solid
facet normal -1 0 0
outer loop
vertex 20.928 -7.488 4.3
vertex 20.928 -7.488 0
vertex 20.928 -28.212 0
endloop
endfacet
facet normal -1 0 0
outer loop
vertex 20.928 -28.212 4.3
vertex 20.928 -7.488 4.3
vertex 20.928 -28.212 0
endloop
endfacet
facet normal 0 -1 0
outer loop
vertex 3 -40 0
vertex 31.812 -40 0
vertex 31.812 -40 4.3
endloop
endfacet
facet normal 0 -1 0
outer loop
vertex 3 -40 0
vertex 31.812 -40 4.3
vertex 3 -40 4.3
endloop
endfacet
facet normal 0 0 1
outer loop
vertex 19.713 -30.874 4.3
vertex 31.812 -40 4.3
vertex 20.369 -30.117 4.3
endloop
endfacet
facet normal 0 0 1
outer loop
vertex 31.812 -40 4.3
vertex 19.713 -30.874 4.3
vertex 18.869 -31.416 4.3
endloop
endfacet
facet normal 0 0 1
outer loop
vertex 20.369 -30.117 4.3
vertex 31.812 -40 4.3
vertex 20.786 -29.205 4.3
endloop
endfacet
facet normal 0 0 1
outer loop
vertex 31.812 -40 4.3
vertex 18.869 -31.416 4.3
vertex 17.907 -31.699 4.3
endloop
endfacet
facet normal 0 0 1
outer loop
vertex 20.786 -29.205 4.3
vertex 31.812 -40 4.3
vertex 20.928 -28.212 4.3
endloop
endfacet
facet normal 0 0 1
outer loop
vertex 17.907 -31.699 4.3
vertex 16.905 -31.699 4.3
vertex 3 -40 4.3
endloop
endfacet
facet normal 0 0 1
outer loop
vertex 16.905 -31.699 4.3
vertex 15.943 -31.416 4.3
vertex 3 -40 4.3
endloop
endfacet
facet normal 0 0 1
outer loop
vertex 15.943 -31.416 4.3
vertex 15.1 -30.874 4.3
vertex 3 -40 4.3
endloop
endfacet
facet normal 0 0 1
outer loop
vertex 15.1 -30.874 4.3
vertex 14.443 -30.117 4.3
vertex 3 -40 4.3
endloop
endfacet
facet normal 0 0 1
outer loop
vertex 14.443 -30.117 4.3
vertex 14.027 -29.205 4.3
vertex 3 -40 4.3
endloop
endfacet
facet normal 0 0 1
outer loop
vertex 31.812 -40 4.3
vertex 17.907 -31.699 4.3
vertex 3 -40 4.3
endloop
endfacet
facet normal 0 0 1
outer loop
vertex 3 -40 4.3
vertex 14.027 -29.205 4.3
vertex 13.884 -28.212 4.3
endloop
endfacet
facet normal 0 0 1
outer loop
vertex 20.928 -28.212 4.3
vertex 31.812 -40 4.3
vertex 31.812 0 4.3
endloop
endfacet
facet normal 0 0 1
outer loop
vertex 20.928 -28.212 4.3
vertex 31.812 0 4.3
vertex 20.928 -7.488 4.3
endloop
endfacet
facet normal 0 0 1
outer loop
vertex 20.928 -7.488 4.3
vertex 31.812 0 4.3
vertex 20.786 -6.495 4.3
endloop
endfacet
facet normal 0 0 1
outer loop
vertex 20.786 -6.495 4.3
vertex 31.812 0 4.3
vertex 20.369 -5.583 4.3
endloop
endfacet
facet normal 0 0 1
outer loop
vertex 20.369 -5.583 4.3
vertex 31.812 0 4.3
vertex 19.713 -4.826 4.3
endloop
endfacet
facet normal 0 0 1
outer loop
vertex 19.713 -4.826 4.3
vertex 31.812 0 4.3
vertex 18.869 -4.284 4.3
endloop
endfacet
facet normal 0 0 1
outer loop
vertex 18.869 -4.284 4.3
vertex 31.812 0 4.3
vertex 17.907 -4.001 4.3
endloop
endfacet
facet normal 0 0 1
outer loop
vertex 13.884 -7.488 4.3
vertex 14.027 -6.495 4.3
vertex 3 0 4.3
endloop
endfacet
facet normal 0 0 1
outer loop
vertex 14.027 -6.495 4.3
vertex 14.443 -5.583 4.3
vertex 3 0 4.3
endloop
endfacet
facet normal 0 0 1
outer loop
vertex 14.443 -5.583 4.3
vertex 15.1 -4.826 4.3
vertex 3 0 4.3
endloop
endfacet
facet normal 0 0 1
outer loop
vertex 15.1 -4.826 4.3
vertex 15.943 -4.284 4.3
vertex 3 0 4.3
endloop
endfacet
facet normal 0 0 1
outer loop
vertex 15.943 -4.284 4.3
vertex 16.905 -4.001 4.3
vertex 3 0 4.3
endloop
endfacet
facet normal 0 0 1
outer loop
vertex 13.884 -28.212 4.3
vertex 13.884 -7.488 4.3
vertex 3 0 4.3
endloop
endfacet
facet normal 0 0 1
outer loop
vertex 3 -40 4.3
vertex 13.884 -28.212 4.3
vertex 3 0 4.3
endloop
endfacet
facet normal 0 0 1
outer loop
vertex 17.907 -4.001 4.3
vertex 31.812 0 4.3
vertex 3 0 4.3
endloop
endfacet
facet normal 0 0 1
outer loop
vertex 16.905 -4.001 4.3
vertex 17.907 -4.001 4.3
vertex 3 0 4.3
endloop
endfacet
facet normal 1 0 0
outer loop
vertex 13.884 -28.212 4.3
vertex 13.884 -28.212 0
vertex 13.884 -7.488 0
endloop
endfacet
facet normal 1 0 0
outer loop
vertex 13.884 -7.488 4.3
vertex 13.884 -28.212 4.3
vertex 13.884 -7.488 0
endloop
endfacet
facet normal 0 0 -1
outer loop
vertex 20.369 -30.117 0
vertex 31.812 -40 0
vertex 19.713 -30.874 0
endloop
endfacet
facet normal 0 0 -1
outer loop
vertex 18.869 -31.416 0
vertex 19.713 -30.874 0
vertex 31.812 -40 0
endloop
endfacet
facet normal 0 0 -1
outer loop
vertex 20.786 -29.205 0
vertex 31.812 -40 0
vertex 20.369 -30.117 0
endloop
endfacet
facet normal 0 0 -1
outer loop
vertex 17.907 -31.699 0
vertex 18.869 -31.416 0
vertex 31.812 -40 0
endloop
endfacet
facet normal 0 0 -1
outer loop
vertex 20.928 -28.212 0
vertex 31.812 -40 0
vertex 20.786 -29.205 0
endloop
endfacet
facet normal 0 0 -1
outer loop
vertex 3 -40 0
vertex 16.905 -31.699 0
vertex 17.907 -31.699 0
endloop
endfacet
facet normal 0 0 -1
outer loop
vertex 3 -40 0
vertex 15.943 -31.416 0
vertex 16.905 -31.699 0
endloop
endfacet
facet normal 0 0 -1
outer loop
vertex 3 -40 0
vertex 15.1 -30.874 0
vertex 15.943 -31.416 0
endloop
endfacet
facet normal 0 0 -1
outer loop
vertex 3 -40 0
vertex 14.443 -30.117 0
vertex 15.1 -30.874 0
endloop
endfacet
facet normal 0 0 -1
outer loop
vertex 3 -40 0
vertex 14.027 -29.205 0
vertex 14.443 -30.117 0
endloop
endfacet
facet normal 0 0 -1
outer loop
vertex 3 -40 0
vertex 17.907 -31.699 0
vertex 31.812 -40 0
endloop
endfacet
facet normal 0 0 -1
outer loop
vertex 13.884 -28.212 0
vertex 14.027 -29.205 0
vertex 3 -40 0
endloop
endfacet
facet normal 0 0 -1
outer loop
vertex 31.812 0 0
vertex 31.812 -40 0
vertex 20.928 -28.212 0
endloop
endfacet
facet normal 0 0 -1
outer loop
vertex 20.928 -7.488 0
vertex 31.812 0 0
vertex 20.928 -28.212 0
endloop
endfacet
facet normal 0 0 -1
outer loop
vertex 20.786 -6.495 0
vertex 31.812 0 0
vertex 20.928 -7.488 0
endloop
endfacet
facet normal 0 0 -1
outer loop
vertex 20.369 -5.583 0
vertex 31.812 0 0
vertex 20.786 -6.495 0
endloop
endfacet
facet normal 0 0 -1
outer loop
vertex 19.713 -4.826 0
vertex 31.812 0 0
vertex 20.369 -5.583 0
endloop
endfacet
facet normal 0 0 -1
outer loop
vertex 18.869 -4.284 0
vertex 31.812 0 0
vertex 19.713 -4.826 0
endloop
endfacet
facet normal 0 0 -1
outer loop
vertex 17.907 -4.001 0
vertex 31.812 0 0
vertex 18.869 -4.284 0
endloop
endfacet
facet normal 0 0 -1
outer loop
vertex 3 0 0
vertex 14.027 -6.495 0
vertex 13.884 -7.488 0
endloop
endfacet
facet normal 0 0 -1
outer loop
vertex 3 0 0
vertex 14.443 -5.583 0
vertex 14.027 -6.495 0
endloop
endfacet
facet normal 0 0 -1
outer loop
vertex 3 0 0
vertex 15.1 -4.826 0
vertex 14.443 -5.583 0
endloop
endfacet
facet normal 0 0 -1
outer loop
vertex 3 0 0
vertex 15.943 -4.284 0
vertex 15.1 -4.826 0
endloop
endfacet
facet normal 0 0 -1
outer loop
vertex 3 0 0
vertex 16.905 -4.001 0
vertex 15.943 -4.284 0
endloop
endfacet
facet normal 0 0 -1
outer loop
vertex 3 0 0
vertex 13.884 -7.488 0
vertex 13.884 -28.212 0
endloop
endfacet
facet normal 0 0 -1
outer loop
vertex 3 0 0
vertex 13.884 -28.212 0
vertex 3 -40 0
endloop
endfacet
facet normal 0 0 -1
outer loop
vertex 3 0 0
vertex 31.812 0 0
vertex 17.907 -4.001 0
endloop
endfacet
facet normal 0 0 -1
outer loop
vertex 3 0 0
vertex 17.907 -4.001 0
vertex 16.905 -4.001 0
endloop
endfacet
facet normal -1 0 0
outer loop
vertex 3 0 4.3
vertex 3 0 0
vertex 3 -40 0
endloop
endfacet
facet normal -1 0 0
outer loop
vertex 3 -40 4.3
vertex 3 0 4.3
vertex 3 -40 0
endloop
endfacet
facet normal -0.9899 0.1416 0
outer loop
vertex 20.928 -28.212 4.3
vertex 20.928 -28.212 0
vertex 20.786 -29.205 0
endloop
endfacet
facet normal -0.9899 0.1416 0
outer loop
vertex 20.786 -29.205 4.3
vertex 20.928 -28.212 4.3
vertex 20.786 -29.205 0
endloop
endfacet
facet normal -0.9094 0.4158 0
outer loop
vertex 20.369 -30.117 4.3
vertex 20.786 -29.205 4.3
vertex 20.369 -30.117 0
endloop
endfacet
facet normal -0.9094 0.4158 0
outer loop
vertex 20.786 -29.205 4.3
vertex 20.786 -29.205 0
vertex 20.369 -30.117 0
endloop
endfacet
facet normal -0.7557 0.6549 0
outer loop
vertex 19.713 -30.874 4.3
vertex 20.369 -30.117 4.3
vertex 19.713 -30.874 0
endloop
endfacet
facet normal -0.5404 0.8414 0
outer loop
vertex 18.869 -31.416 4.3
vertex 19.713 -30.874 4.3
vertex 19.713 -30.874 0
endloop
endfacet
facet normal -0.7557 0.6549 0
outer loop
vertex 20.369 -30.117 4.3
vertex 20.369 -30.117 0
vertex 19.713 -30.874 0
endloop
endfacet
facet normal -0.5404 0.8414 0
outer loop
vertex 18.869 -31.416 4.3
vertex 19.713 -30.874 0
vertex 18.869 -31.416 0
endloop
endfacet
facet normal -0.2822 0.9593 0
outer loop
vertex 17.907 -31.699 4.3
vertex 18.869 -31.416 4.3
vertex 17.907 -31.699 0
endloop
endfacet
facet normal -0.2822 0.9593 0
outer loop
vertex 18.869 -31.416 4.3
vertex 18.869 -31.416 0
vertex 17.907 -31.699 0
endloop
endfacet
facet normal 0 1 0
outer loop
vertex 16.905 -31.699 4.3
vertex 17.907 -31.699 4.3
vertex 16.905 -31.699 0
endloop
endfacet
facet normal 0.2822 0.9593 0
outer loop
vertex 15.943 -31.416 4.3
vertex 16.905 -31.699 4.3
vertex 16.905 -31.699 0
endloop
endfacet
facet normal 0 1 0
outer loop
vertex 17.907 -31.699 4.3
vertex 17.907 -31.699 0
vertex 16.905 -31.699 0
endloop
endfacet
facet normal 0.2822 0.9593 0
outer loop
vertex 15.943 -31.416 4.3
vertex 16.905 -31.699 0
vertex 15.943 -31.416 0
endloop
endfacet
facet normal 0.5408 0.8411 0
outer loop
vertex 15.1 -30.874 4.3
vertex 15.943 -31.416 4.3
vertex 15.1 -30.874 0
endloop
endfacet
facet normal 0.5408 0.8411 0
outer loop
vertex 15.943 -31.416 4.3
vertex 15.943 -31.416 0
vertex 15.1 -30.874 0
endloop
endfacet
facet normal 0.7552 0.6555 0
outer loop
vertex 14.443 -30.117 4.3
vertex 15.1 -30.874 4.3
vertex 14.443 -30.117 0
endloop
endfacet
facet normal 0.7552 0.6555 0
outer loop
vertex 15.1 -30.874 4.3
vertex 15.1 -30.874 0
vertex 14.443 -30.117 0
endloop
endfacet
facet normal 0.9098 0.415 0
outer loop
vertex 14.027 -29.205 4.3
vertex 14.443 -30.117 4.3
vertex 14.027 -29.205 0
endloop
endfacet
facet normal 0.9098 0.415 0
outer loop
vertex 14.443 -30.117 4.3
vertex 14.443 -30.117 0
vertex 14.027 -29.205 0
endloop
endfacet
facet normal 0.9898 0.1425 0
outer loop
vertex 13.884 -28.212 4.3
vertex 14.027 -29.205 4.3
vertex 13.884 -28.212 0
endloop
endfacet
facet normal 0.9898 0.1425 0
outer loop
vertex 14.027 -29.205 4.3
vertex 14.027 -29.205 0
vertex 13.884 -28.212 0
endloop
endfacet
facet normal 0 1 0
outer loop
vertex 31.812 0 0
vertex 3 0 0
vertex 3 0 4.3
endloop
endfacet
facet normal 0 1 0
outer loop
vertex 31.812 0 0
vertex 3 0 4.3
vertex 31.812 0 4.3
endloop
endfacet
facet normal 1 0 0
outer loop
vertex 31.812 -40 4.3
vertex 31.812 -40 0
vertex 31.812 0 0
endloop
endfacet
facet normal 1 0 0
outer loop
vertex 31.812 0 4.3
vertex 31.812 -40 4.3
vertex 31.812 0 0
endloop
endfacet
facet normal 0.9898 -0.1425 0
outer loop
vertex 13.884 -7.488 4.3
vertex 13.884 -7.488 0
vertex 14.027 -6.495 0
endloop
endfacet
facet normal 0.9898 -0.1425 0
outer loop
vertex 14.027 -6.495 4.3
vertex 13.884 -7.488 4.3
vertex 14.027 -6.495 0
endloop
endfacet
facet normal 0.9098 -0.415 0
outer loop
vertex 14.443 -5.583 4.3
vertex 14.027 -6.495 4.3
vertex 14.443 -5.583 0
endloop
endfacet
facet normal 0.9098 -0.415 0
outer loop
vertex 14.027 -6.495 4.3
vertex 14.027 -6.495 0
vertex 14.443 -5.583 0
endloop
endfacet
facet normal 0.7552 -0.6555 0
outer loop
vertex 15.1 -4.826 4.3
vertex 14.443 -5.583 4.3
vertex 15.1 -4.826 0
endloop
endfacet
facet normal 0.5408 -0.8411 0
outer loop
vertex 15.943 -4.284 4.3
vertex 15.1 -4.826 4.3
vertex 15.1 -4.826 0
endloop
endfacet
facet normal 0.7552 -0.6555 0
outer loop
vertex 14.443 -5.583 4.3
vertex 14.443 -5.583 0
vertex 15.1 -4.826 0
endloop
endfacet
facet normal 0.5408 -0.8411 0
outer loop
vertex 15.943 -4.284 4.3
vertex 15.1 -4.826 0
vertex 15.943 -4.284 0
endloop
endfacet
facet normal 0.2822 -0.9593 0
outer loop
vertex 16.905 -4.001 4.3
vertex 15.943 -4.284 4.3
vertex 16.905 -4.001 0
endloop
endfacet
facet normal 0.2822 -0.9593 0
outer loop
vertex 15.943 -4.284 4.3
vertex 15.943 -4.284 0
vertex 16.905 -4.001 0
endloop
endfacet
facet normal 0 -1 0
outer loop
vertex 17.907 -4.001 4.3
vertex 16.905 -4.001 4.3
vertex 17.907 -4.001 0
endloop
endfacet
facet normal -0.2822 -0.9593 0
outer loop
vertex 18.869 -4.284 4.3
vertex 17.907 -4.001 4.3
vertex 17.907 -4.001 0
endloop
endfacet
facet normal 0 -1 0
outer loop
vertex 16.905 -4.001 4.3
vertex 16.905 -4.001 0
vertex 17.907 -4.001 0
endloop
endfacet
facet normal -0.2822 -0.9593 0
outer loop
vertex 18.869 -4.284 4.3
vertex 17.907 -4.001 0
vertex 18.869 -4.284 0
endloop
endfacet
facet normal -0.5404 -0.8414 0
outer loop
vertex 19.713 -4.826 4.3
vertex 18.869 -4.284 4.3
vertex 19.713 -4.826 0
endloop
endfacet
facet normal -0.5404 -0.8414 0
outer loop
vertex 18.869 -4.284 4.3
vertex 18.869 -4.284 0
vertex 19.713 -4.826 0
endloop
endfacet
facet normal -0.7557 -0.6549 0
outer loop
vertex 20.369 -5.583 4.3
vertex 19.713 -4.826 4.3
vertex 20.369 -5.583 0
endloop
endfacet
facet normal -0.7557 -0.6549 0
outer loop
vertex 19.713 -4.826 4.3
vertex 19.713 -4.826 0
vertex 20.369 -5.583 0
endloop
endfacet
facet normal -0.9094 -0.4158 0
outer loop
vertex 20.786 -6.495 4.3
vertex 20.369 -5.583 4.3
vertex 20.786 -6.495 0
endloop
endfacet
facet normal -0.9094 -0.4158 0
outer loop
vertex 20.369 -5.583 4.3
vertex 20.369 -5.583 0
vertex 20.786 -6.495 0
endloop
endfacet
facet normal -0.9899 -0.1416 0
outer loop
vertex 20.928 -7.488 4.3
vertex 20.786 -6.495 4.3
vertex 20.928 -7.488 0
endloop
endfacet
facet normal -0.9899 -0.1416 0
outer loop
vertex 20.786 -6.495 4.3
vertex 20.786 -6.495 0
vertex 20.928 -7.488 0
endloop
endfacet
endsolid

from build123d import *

# Parameters (mm, degrees)
EXTRUDE_1_DEPTH = 4.3


with BuildPart() as part:
    # 草图1 → 凸台-拉伸1 (new body)
    with BuildSketch(Plane.XY):
        Polygon((31.812419505, -35.7), (31.812419505, -40), (3, -40), (3, -35.7), (3, 0), (31.812419505, 0), align=None)
        with BuildLine():
            Line((20.928372126, -7.487592169), (20.928372126, -28.212407831))
            ThreePointArc((20.928372126, -28.212407831), (17.406209752, -31.734570205), (13.884047379, -28.212407831))
            Line((13.884047379, -28.212407831), (13.884047379, -7.487592169))
            ThreePointArc((13.884047379, -7.487592169), (17.406209752, -3.965429795), (20.928372126, -7.487592169))
        make_face(mode=Mode.SUBTRACT)
    extrude(amount=EXTRUDE_1_DEPTH)


solid = part.part
